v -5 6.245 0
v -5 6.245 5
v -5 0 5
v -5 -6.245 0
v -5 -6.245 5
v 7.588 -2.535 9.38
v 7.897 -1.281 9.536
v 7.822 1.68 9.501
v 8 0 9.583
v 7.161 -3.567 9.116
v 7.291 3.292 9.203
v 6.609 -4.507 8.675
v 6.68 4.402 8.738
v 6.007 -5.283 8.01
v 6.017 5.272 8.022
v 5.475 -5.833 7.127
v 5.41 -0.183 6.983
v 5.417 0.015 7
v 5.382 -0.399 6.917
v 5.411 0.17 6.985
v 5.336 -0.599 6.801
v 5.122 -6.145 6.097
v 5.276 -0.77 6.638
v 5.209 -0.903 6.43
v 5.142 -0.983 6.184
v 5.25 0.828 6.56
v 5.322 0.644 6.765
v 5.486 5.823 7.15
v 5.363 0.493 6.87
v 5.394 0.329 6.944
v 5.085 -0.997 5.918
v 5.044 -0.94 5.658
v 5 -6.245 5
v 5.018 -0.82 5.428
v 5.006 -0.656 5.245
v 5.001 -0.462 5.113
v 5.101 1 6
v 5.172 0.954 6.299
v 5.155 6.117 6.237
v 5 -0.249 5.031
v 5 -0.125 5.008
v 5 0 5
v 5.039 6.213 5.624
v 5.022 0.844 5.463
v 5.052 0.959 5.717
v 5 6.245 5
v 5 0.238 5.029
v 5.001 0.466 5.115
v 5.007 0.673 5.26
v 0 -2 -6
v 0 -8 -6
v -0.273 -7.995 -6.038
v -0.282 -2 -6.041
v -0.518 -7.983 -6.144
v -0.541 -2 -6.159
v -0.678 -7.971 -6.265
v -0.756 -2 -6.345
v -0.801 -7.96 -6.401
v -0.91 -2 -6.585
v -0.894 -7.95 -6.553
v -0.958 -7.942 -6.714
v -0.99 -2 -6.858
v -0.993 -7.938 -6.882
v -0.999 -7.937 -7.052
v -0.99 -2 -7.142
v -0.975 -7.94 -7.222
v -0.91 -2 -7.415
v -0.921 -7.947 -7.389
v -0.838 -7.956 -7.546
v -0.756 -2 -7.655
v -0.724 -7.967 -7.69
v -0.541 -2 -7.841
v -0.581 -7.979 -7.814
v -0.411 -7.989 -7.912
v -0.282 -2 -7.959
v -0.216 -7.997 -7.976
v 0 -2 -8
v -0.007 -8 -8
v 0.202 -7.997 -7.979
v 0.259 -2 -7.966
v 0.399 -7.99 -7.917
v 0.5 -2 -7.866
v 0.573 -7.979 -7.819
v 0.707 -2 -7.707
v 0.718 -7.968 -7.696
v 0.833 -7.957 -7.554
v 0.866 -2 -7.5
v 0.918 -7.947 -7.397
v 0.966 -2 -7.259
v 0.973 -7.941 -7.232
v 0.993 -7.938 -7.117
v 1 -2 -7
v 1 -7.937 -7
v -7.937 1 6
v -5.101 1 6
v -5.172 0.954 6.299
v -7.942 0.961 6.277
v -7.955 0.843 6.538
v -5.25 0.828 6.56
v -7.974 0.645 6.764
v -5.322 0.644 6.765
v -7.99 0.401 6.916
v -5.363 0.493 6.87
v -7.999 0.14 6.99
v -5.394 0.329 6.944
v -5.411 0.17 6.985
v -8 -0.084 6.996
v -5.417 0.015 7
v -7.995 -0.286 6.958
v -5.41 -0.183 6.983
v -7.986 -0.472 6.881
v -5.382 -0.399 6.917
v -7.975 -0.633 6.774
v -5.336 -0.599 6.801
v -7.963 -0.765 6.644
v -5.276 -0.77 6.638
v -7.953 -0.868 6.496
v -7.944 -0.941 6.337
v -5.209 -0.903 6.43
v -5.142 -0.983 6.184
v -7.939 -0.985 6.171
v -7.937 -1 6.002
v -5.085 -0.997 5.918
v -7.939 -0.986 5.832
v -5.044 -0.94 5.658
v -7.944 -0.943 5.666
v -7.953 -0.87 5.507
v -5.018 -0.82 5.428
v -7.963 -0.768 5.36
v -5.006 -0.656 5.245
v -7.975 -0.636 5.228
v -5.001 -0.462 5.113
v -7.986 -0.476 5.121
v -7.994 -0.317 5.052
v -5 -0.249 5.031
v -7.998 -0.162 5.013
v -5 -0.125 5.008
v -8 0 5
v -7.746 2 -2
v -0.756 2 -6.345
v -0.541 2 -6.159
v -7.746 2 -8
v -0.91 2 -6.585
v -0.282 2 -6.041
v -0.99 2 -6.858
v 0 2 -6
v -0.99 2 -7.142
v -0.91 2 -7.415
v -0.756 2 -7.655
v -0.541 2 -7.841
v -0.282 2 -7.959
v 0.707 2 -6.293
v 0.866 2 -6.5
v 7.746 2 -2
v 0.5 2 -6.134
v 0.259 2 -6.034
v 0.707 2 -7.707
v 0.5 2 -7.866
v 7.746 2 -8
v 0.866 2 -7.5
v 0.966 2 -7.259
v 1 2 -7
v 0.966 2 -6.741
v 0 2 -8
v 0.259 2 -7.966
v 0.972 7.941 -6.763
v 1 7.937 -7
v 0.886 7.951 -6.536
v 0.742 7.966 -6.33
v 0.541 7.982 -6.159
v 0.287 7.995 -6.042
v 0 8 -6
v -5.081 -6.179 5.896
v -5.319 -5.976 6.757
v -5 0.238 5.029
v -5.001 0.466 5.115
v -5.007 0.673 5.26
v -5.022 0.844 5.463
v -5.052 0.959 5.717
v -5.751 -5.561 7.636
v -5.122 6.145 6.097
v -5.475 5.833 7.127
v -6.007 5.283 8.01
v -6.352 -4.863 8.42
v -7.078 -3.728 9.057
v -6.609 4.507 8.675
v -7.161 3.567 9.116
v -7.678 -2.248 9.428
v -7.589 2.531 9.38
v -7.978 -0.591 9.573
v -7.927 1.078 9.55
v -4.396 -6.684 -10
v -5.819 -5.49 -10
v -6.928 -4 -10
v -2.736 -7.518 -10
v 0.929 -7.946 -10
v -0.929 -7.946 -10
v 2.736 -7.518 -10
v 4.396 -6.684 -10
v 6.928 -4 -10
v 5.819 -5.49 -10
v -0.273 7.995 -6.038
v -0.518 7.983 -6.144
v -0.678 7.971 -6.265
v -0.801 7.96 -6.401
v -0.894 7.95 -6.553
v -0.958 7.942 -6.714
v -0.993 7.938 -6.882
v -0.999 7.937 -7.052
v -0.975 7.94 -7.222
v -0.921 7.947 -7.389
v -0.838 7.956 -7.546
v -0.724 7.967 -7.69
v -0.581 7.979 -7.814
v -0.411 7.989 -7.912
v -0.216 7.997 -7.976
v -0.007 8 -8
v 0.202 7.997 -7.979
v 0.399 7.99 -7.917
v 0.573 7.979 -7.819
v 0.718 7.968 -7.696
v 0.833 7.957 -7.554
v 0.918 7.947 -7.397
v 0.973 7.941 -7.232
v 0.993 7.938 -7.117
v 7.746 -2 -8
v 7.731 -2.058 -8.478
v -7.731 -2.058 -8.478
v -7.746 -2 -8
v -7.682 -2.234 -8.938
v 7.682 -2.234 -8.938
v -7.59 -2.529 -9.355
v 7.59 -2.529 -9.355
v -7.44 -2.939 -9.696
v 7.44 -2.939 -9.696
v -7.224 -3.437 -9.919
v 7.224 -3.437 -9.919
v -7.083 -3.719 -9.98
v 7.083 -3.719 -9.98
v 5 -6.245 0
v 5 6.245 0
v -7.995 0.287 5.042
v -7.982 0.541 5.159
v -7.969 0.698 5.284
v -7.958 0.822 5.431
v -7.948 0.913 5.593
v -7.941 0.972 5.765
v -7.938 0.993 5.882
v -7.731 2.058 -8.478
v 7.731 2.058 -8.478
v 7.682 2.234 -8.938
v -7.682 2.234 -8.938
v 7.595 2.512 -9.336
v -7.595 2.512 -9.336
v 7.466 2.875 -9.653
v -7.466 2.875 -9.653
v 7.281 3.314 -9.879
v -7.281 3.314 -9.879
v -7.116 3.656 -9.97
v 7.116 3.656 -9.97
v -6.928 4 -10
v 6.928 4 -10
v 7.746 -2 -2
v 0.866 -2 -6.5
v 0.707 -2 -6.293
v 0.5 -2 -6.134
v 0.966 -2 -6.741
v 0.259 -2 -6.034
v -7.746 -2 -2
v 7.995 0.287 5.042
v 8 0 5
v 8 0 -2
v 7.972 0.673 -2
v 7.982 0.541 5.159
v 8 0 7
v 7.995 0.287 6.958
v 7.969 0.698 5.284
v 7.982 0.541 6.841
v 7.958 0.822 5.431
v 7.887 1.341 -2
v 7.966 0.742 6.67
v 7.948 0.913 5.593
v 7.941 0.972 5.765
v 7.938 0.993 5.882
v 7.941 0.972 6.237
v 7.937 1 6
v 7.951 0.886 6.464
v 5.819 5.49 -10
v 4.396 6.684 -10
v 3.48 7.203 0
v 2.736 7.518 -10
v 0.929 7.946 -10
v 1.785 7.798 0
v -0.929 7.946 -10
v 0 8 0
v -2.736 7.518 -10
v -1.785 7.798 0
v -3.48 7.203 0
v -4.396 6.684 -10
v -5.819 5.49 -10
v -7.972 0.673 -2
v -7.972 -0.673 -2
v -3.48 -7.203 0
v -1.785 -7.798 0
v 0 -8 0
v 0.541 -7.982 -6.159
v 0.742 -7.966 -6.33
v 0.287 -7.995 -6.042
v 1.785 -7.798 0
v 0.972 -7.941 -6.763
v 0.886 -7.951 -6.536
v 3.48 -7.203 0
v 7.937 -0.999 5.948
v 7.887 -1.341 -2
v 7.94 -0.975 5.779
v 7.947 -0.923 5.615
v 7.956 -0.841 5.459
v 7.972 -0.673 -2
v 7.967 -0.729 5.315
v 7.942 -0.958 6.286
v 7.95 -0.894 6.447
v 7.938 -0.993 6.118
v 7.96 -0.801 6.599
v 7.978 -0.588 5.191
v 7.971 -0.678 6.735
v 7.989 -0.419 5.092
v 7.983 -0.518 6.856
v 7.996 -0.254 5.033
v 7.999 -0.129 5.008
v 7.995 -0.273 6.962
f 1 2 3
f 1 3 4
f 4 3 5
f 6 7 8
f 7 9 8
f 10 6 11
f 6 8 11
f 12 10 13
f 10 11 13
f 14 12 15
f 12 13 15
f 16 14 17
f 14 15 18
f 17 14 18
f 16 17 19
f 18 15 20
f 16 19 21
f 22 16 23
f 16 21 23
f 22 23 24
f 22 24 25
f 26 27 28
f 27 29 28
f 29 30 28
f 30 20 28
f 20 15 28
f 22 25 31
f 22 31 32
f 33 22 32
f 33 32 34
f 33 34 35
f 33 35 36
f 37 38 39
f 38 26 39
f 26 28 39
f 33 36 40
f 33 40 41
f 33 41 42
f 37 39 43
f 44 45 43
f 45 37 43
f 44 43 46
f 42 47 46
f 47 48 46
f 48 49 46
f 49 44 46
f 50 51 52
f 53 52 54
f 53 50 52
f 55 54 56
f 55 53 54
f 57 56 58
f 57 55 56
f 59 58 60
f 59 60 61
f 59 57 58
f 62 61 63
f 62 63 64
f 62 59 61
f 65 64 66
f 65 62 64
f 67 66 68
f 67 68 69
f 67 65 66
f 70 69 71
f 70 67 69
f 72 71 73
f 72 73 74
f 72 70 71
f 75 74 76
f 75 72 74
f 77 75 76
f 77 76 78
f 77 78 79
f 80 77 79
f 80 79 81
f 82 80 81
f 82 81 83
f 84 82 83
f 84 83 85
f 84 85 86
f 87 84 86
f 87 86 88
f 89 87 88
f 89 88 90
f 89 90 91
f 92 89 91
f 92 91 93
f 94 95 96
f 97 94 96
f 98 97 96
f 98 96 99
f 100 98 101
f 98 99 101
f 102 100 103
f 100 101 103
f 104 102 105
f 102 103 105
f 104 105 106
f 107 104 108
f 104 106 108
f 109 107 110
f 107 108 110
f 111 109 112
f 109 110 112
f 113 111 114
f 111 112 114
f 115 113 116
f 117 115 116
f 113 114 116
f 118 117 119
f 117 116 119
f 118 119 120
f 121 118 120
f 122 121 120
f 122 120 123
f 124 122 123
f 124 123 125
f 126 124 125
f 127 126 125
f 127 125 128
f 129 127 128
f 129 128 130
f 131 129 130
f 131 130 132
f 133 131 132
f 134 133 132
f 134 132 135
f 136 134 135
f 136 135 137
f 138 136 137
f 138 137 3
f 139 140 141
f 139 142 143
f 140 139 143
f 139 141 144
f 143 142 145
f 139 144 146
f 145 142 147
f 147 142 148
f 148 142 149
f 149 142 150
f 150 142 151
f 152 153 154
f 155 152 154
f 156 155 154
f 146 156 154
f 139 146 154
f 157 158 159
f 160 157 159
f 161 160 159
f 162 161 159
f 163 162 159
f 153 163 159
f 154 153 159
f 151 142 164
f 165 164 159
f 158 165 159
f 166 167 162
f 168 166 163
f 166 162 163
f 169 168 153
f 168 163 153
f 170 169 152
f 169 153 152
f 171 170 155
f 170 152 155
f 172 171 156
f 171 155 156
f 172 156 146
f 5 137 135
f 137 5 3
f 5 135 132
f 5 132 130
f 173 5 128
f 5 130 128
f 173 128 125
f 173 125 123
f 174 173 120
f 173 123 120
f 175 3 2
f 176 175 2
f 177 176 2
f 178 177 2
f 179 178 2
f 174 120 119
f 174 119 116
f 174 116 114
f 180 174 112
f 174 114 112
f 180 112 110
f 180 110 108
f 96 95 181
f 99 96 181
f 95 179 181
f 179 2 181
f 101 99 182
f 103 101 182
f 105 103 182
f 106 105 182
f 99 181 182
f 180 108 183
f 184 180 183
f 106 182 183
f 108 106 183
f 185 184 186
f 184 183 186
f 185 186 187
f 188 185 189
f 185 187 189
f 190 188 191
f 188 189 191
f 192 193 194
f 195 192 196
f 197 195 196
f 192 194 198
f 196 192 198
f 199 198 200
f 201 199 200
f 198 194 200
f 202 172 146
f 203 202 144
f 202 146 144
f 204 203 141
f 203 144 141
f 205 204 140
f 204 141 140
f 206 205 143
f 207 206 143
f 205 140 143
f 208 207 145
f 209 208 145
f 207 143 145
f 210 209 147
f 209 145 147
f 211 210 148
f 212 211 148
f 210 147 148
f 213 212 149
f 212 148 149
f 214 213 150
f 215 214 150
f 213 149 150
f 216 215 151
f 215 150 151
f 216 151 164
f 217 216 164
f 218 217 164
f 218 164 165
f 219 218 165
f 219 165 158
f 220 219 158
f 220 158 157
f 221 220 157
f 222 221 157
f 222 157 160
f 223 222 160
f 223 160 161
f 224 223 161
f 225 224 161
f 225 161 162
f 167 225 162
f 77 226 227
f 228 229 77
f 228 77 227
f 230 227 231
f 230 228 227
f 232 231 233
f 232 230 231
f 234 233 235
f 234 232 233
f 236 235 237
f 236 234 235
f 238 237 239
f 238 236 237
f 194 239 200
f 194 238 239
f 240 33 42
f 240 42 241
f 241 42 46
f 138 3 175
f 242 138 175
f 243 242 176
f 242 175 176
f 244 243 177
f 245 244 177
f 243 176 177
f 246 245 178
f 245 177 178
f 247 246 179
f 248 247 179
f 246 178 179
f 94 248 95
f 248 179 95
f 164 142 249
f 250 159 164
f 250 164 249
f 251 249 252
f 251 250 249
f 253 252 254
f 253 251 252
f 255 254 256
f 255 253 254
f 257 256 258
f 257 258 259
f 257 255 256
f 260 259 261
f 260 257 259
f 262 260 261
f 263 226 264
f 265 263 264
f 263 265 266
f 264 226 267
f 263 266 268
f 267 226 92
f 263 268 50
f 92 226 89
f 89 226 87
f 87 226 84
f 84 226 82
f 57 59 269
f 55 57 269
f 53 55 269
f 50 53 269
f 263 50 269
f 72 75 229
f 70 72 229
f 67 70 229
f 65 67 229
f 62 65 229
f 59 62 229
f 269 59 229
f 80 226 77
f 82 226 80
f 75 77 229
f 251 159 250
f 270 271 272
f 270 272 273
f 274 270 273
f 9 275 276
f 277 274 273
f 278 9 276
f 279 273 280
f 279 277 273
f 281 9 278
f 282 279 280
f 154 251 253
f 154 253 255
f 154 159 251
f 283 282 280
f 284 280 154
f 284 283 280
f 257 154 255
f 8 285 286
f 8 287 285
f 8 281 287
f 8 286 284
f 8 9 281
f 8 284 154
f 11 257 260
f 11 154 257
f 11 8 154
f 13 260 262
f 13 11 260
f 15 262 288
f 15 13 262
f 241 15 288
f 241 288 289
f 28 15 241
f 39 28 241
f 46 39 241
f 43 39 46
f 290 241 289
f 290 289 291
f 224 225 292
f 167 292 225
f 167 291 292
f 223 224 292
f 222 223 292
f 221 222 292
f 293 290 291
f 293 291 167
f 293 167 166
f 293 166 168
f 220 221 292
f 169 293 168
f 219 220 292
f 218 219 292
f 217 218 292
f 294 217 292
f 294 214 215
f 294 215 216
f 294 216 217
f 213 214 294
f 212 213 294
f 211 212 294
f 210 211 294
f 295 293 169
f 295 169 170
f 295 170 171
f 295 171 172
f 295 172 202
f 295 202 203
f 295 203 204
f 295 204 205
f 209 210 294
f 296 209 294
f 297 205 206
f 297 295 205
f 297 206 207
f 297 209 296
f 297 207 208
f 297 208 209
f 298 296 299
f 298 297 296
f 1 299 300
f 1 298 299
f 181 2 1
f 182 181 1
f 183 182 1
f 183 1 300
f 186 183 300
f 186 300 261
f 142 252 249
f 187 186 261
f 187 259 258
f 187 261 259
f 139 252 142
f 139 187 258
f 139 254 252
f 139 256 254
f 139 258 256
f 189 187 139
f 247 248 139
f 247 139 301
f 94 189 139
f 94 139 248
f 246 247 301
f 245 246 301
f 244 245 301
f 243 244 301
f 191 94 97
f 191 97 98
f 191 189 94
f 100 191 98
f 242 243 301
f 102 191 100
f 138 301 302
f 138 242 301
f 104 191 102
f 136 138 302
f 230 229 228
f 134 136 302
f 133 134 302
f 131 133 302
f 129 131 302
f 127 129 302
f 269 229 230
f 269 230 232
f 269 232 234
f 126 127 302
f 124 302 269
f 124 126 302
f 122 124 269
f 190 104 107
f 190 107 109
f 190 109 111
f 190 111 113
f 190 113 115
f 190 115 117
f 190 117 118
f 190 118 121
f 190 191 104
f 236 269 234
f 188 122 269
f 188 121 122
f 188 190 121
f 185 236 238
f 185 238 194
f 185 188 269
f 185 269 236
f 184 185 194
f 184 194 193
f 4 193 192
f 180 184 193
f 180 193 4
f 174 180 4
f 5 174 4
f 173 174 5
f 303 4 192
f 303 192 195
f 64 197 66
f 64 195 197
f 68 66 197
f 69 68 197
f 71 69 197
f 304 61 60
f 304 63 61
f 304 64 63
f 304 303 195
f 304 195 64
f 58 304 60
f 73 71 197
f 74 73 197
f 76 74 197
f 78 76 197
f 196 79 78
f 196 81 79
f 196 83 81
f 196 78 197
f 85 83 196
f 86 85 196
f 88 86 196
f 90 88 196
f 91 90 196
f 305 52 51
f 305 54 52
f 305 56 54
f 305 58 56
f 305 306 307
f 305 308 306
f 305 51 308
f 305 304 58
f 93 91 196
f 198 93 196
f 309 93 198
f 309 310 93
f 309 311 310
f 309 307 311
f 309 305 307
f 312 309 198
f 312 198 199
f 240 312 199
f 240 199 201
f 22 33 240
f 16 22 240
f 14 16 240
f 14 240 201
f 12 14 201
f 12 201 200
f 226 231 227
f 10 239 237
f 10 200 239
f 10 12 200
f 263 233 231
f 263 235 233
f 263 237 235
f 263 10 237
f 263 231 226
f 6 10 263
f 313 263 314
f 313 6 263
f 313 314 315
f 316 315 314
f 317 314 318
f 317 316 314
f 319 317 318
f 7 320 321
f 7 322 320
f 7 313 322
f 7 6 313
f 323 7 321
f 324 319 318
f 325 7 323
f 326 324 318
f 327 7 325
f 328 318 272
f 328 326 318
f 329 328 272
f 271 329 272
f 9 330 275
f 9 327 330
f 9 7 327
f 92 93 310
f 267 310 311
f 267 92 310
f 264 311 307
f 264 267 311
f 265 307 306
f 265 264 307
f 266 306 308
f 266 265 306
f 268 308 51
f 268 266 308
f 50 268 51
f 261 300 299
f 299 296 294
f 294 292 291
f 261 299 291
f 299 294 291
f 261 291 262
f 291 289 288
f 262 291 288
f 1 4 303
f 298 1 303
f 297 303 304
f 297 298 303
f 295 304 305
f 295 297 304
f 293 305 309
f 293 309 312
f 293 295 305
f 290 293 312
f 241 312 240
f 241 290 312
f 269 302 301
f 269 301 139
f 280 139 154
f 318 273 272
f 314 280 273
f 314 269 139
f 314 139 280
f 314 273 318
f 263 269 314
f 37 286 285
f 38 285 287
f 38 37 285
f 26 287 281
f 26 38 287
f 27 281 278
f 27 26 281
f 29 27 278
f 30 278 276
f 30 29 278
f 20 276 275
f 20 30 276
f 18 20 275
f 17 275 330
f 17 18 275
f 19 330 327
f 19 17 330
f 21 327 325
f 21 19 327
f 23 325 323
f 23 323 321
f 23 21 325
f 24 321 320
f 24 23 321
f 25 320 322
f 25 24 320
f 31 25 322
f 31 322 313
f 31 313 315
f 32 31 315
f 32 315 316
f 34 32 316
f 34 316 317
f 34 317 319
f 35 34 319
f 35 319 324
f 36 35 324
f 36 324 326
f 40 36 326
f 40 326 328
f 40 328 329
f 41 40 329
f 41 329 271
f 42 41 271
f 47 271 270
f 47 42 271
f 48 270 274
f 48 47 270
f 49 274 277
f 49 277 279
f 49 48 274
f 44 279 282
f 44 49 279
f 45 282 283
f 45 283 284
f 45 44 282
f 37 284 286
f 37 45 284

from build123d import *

# Parameters (mm, degrees)
F0_R        = 8
F1_DEPTH    = 10
F3_DEPTH    = 10
F5_DEPTH    = 8
F6_R        = 2
F7_T1_DEPTH = 37.4899959968
F9_DEPTH    = 12.5
F11_DEPTH   = 12.5


# Not quite as in the source:
# - a fillet or chamfer that OpenCascade refuses, or shapes differently, is made with other operations: its cross-section is extruded or revolved along the edge and cut away or added


with BuildPart() as f1:
    # F0 (on Top) → F1 (new body, symmetric)
    with BuildSketch(Plane.XY):
        Circle(F0_R)
    extrude(amount=F1_DEPTH, both=True)

    # F2 (on face) → F3 (cut)
    with BuildSketch(Plane.XY.offset(10)):
        with BuildLine():
            ThreePointArc((5, 6.2449979984), (0, 8), (-5, 6.2449979984))
            Line((-5, 6.2449979984), (-5, -6.2449979984))
            ThreePointArc((-5, -6.2449979984), (0, -8), (5, -6.2449979984))
            Line((5, -6.2449979984), (5, 6.2449979984))
        make_face()
    extrude(amount=-F3_DEPTH, mode=Mode.SUBTRACT)

    # F4 (on face) → F5 (cut)
    with BuildSketch(Plane(origin=(0, 0, -10), x_dir=(1, 0, 0), z_dir=(0, 0, -1))):
        with BuildLine():
            Line((7.7459666924, 2), (-7.7459666924, 2))
            ThreePointArc((-7.7459666924, 2), (-8, 0), (-7.7459666924, -2))
            Line((-7.7459666924, -2), (7.7459666924, -2))
            ThreePointArc((7.7459666924, -2), (7.9362375701, -1.0080343399), (8, 0))
            ThreePointArc((8, 0), (7.9362375701, 1.0080343399), (7.7459666924, 2))
        make_face()
    extrude(amount=-F5_DEPTH, mode=Mode.SUBTRACT)

    # F6
    f6_edges = [f1.edges().sort_by_distance(p)[0] for p in [
        (0, 2, -10),
        (0, -2, -10),
    ]]
    fillet(f6_edges, radius=F6_R)

    # F7: fillet of radius 5 on 2 edges, made by hand

    # F7_s2 → F7_t1 (cut)
    with BuildSketch(Plane.XZ.offset(-18.7449979984)):
        with BuildLine():
            ThreePointArc((-5, 5), (-6.4644660941, 8.5355339059), (-10, 10))
            Line((-10, 10), (-5, 10))
            Line((-5, 10), (-5, 5))
        make_face()
        with BuildLine():
            ThreePointArc((10, 10), (6.4644660941, 8.5355339059), (5, 5))
            Line((5, 5), (5, 10))
            Line((5, 10), (10, 10))
        make_face()
    extrude(amount=F7_T1_DEPTH, mode=Mode.SUBTRACT)

    # F8 (on Right) → F9 (cut, symmetric)
    with BuildSketch(Plane.YZ):
        with BuildLine():
            ThreePointArc((0, 5), (0.7071067812, 5.2928932188), (1, 6))
            ThreePointArc((1, 6), (-0.7071067812, 6.7071067812), (0, 5))
        make_face()
    extrude(amount=F9_DEPTH, both=True, mode=Mode.SUBTRACT)

    # F10 (on Front) → F11 (cut, symmetric)
    with BuildSketch(Plane.XZ):
        with BuildLine():
            ThreePointArc((0, -6), (-0.7071067812, -7.7071067812), (1, -7))
            ThreePointArc((1, -7), (0.7071067812, -6.2928932188), (0, -6))
        make_face()
    extrude(amount=F11_DEPTH, both=True, mode=Mode.SUBTRACT)


solid = f1.part
